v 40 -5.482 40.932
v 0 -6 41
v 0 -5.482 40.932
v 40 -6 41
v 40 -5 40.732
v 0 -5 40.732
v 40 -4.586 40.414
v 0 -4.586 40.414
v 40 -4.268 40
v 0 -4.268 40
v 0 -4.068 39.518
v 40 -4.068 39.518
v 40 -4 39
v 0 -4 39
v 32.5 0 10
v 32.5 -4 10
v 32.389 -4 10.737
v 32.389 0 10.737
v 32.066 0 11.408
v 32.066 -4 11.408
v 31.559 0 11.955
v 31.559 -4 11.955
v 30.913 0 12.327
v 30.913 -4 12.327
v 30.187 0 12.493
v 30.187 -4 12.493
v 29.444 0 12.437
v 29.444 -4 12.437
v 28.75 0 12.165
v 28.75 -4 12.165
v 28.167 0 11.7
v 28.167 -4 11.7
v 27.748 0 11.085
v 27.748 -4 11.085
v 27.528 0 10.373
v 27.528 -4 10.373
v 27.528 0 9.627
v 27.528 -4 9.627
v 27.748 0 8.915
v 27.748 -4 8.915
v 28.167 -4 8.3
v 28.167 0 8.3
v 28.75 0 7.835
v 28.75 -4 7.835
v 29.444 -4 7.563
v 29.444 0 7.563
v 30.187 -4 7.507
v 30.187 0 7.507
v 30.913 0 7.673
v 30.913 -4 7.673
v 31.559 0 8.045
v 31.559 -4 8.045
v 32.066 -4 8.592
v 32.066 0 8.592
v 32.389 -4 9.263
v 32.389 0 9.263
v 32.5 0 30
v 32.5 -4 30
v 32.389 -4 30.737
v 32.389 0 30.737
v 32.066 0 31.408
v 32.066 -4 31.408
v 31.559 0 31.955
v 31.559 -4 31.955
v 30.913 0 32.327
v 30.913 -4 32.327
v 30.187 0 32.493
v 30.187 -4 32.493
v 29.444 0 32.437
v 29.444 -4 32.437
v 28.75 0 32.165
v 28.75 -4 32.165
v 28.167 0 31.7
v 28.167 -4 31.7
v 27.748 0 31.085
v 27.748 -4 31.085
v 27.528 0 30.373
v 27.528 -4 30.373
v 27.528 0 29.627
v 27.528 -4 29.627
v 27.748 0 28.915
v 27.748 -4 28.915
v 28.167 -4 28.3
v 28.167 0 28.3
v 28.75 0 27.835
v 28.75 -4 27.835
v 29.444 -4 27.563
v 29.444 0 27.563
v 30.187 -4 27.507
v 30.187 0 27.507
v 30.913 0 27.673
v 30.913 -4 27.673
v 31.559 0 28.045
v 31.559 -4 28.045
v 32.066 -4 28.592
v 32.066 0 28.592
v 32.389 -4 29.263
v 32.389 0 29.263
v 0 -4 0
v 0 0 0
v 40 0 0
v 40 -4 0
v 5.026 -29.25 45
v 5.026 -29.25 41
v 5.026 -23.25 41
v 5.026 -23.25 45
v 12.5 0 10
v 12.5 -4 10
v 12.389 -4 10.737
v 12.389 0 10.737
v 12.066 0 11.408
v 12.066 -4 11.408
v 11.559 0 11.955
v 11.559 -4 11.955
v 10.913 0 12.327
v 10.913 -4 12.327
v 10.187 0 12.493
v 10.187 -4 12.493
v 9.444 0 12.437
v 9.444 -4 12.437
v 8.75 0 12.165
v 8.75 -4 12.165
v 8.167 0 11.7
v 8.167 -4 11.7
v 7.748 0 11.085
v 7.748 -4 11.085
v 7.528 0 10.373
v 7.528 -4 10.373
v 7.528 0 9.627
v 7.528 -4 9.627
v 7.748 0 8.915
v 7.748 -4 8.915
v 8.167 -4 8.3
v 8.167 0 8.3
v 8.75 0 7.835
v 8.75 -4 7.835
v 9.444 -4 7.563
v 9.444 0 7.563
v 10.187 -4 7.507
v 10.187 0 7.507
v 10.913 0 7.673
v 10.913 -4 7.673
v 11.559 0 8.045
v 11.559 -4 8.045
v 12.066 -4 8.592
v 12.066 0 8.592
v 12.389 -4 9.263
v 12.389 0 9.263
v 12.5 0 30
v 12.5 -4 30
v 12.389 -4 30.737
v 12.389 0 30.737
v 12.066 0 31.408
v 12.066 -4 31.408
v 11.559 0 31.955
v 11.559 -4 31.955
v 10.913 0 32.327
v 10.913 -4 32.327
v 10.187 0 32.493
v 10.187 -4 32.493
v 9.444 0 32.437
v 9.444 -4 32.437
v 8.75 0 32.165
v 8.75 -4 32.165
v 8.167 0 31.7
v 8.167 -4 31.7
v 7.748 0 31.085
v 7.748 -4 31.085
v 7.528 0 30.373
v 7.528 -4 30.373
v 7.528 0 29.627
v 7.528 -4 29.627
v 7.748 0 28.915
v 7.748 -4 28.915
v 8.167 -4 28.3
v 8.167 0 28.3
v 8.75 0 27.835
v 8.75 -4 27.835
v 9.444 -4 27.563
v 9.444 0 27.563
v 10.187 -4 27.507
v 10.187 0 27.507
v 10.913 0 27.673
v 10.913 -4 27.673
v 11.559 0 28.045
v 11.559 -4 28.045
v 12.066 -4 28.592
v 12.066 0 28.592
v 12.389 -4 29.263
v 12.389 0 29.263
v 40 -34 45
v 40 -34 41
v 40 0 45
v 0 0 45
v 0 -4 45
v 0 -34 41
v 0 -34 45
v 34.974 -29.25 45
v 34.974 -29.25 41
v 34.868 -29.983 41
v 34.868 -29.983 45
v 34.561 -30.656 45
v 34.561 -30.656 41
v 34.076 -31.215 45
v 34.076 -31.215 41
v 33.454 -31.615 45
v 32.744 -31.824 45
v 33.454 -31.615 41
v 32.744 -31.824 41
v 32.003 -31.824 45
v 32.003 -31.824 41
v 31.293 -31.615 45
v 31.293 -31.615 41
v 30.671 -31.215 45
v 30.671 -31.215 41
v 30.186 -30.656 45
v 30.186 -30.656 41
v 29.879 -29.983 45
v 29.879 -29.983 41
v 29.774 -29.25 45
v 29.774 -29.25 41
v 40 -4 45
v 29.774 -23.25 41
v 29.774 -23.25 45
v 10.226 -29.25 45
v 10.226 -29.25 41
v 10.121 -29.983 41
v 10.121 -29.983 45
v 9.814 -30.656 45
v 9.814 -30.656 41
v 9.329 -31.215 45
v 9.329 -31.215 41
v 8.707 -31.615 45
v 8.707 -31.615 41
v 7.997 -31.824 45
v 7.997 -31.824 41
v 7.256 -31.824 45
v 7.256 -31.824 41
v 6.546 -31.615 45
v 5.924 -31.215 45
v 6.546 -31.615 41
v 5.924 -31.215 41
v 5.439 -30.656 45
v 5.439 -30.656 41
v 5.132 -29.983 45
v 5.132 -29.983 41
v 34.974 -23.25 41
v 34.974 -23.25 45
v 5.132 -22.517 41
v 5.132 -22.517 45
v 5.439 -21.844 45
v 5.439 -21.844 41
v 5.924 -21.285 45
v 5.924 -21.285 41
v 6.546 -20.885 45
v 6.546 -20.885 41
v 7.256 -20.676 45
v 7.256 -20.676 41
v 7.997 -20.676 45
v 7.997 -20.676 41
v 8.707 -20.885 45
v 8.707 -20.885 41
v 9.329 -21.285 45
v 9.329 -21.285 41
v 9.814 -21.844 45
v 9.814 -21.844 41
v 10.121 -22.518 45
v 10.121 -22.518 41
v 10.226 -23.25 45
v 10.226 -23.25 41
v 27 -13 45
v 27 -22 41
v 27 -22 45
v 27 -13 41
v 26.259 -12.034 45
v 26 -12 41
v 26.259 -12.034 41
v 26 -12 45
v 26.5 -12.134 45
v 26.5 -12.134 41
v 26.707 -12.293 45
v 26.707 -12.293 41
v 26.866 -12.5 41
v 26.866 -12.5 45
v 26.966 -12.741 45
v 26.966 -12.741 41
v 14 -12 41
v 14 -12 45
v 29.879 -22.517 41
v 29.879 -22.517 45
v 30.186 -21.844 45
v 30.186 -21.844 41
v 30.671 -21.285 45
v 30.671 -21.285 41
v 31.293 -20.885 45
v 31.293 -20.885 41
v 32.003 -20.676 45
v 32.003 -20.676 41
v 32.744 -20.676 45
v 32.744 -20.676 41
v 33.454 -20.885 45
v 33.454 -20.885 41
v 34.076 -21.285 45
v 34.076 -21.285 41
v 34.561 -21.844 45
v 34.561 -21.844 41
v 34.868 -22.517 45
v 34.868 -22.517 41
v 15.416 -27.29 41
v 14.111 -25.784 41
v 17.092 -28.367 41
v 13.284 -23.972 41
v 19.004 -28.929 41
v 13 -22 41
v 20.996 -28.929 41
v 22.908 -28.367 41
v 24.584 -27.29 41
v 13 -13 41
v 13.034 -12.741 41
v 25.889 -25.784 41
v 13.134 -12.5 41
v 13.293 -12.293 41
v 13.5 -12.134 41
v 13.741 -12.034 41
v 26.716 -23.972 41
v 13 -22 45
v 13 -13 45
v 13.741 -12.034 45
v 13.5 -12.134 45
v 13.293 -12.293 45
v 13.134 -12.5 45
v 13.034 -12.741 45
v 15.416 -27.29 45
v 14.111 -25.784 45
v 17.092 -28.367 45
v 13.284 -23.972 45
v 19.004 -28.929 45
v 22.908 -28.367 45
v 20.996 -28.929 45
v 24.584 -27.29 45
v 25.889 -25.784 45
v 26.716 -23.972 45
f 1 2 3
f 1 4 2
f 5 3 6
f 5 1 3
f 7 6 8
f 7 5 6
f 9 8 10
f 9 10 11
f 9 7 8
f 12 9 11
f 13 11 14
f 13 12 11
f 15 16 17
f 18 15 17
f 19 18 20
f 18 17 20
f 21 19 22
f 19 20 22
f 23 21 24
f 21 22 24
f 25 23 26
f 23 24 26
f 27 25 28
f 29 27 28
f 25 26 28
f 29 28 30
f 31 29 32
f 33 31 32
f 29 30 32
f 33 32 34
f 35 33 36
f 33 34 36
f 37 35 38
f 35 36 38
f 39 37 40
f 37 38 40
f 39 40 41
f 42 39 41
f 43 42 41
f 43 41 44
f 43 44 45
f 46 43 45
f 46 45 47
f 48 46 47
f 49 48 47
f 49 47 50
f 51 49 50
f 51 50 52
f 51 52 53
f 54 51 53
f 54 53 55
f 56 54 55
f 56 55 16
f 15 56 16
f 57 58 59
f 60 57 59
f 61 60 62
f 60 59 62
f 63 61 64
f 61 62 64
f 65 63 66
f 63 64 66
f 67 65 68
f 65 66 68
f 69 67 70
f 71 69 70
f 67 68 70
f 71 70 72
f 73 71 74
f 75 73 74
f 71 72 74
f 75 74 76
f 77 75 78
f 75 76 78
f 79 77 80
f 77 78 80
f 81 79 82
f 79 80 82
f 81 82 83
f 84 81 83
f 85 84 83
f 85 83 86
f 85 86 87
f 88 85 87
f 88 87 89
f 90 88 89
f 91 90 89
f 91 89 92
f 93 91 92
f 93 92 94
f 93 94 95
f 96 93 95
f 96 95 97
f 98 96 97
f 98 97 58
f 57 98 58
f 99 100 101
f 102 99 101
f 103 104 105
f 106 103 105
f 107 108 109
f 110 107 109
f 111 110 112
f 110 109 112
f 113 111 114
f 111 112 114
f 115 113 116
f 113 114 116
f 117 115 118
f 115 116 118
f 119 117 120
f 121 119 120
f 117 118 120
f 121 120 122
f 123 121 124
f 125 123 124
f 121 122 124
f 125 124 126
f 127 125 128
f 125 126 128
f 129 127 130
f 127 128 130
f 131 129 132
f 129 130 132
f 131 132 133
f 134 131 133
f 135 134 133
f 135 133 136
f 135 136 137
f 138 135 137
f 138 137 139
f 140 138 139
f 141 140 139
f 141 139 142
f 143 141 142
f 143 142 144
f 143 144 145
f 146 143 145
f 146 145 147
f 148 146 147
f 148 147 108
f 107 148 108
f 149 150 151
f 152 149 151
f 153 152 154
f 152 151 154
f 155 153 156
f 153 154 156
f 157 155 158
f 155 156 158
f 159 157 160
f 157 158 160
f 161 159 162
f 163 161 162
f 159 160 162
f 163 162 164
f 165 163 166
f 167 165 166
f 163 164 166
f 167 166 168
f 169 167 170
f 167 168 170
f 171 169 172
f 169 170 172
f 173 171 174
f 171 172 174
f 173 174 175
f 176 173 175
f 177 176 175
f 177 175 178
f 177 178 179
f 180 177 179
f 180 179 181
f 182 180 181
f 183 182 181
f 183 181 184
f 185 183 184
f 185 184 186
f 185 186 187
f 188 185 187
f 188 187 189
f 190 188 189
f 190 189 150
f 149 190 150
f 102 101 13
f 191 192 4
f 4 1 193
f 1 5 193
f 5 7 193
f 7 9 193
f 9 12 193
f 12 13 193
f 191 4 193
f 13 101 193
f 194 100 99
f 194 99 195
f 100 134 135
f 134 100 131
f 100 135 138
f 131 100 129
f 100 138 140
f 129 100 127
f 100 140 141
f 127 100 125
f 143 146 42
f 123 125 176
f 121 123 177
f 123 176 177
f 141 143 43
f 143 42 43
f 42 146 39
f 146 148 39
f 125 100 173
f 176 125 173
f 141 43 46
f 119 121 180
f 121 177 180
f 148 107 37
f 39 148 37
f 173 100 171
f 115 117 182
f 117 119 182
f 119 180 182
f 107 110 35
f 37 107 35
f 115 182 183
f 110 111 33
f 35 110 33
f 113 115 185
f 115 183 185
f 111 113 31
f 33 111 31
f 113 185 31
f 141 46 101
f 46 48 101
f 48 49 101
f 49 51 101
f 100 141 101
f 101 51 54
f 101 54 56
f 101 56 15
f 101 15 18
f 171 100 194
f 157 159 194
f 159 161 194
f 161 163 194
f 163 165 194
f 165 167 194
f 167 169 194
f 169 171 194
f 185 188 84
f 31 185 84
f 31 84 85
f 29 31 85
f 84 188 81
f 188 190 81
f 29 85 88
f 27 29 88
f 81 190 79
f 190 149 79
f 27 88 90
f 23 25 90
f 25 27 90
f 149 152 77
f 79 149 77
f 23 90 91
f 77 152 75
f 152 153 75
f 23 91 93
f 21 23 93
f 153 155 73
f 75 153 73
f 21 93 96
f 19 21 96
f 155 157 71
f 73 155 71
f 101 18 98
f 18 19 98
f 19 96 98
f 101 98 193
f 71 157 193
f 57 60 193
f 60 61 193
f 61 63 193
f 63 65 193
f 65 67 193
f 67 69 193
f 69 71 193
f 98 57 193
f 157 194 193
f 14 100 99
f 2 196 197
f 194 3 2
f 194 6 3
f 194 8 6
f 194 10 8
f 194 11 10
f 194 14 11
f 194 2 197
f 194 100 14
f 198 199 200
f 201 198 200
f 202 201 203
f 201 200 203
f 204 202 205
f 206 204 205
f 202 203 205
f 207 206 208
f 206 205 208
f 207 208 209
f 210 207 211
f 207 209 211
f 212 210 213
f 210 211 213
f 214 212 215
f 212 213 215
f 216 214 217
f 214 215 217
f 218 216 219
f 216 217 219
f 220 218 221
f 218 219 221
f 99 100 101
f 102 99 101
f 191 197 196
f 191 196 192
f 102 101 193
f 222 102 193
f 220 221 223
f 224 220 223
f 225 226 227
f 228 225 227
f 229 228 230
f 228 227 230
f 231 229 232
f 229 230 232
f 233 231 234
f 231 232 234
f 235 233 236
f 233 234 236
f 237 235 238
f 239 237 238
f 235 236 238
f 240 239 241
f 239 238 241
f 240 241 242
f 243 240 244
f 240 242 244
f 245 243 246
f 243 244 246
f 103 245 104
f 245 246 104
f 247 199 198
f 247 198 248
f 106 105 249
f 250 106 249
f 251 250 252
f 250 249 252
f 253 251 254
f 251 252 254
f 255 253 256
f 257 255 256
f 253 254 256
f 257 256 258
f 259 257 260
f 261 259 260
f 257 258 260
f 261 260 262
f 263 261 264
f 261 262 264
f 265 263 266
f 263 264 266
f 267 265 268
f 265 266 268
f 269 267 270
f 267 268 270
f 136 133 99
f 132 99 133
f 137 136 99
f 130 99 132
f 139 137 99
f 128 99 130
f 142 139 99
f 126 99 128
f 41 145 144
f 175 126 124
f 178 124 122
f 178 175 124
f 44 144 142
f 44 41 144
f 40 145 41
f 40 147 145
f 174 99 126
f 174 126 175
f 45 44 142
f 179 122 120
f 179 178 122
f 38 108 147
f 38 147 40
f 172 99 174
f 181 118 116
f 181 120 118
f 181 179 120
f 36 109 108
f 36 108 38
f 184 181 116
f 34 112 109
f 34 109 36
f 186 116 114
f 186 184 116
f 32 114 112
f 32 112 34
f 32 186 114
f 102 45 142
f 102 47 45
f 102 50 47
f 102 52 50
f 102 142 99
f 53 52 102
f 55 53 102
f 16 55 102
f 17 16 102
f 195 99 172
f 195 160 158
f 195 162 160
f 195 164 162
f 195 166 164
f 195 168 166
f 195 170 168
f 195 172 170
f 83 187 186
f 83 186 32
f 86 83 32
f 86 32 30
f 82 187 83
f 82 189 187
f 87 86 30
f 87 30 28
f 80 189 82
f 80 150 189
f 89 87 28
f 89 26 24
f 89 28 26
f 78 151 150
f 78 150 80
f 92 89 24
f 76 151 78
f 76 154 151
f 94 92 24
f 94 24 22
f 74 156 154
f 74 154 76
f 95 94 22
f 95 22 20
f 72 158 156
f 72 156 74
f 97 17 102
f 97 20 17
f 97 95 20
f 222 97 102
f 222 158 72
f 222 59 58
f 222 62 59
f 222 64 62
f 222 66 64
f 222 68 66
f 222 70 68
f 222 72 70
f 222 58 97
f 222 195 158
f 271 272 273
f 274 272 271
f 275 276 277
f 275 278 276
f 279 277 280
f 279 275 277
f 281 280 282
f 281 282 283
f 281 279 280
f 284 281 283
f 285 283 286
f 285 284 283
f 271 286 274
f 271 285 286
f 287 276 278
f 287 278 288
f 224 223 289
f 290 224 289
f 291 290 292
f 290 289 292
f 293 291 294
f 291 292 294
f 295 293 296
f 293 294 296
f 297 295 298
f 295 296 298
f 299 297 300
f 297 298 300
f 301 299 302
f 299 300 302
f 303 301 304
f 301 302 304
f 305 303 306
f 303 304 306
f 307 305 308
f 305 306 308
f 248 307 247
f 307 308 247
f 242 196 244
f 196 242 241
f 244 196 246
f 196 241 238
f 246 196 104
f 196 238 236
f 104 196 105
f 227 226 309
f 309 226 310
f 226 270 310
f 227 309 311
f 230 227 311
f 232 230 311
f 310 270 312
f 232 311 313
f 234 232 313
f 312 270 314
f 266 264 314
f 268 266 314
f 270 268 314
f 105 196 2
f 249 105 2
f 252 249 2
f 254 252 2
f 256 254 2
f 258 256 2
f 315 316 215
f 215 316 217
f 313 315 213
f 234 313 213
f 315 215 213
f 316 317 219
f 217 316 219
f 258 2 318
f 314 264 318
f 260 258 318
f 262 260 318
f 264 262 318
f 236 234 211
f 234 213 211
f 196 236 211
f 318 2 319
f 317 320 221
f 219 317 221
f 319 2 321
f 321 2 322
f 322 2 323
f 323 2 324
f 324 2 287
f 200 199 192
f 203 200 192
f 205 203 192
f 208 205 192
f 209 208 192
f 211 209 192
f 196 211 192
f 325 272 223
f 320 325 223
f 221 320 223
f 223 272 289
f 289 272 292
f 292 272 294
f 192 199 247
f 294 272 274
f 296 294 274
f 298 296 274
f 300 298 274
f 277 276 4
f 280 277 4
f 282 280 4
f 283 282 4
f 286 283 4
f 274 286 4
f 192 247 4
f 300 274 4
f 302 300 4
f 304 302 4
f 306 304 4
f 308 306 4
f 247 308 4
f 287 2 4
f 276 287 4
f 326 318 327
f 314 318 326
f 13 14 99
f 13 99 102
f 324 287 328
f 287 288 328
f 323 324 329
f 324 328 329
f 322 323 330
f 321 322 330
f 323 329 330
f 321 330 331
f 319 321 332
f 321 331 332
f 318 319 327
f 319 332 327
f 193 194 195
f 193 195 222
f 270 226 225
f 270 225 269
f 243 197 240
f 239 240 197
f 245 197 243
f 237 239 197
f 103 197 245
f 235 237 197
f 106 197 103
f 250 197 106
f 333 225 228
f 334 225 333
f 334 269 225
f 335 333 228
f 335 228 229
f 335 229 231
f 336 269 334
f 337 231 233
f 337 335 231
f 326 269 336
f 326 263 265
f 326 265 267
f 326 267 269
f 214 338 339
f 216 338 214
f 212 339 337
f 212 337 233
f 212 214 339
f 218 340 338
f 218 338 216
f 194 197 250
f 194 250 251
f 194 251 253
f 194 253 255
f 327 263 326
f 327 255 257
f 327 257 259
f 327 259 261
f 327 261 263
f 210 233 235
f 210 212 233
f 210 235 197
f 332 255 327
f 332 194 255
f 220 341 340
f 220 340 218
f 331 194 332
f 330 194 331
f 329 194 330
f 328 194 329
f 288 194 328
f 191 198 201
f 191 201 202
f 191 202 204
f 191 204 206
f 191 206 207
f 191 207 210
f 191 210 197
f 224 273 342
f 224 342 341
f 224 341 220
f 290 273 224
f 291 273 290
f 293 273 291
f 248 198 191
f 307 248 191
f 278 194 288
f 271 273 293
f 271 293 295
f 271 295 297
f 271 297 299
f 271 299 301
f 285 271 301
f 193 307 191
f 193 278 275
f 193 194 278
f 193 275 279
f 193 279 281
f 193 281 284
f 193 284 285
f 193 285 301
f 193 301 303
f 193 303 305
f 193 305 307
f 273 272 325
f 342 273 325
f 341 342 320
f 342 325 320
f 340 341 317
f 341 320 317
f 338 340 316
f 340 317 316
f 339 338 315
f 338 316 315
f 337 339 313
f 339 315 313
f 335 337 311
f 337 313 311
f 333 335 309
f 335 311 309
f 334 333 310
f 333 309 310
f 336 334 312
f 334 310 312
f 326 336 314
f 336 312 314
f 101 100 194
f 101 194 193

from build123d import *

# Parameters (mm, degrees)
SKETCH_W        = 40
SKETCH_H        = 45
PAD_DEPTH       = 4
SKETCH001_R     = 2.5
POCKET_DEPTH    = 4.001
SKETCH002_W     = 40
SKETCH002_H     = 4
PAD001_DEPTH    = 30
FILLET_R        = 2
POCKET001_DEPTH = 4.001
FILLET001_R     = 1
FILLET002_R     = 1


with BuildPart() as pad:
    # Sketch → Pad (new body)
    with BuildSketch(Plane.XZ):
        with Locations((20, 22.5)):
            Rectangle(SKETCH_W, SKETCH_H)
    extrude(amount=PAD_DEPTH)


with BuildPart() as pocket:
    # Pocket base: copy of Pad
    add(pad.part)

    # Sketch001 → Pocket (cut, through all)
    with BuildSketch(Plane.XZ.offset(4)):
        with Locations((10, 10)):
            Circle(SKETCH001_R)
        with Locations((30, 10)):
            Circle(SKETCH001_R)
        with Locations((10, 30)):
            Circle(SKETCH001_R)
        with Locations((30, 30)):
            Circle(SKETCH001_R)
    extrude(amount=-POCKET_DEPTH, mode=Mode.SUBTRACT)


with BuildPart() as pad001:
    # Pad001 base: copy of Pad
    add(pad.part)

    # Sketch002 → Pad001 (new body)
    with BuildSketch(Plane.XZ.offset(4)):
        with Locations((20, 43)):
            Rectangle(SKETCH002_W, SKETCH002_H)
    extrude(amount=PAD001_DEPTH)


with BuildPart() as fillet002:
    # Fusion base: copy of Pad
    add(pad.part)

    # Fusion: union Pad001
    add(pad001.part)

    # Fillet
    fillet_edges = [fillet002.edges().sort_by_distance(p)[0] for p in [
        (20, -4, 41),
    ]]
    fillet(fillet_edges, radius=FILLET_R)

    # Sketch003 → Pocket001 (cut, through all)
    with BuildSketch(Plane(origin=(0, 0, 41), x_dir=(1, 0, 0), z_dir=(0, 0, -1))):
        with BuildLine():
            ThreePointArc((27, 22), (20, 29), (13, 22))
            Line((13, 12), (13, 22))
            Line((27, 12), (13, 12))
            Line((27, 22), (27, 12))
        make_face()
        with BuildLine():
            ThreePointArc((34.9735, 29.25), (32.3735, 31.85), (29.7735, 29.25))
            Line((29.7735, 29.25), (29.7735, 23.25))
            ThreePointArc((29.7735, 23.25), (32.3735, 20.649999), (34.9735, 23.25))
            Line((34.9735, 29.25), (34.9735, 23.25))
        make_face()
        with BuildLine():
            ThreePointArc((10.2265, 29.250019), (7.626491, 31.85), (5.0265, 29.25))
            Line((5.0265, 29.25), (5.0265, 23.25))
            ThreePointArc((5.0265, 23.25), (7.62651, 20.65), (10.2265, 23.250019))
            Line((10.2265, 29.250019), (10.2265, 23.250019))
        make_face()
    extrude(amount=-POCKET001_DEPTH, mode=Mode.SUBTRACT)

    # Fillet001
    fillet001_edges = [fillet002.edges().sort_by_distance(p)[0] for p in [
        (13, -12, 43),
    ]]
    fillet(fillet001_edges, radius=FILLET001_R)

    # Fillet002
    fillet002_edges = [fillet002.edges().sort_by_distance(p)[0] for p in [
        (27, -12, 43),
    ]]
    fillet(fillet002_edges, radius=FILLET002_R)


solid = Compound([pocket.part, fillet002.part])
